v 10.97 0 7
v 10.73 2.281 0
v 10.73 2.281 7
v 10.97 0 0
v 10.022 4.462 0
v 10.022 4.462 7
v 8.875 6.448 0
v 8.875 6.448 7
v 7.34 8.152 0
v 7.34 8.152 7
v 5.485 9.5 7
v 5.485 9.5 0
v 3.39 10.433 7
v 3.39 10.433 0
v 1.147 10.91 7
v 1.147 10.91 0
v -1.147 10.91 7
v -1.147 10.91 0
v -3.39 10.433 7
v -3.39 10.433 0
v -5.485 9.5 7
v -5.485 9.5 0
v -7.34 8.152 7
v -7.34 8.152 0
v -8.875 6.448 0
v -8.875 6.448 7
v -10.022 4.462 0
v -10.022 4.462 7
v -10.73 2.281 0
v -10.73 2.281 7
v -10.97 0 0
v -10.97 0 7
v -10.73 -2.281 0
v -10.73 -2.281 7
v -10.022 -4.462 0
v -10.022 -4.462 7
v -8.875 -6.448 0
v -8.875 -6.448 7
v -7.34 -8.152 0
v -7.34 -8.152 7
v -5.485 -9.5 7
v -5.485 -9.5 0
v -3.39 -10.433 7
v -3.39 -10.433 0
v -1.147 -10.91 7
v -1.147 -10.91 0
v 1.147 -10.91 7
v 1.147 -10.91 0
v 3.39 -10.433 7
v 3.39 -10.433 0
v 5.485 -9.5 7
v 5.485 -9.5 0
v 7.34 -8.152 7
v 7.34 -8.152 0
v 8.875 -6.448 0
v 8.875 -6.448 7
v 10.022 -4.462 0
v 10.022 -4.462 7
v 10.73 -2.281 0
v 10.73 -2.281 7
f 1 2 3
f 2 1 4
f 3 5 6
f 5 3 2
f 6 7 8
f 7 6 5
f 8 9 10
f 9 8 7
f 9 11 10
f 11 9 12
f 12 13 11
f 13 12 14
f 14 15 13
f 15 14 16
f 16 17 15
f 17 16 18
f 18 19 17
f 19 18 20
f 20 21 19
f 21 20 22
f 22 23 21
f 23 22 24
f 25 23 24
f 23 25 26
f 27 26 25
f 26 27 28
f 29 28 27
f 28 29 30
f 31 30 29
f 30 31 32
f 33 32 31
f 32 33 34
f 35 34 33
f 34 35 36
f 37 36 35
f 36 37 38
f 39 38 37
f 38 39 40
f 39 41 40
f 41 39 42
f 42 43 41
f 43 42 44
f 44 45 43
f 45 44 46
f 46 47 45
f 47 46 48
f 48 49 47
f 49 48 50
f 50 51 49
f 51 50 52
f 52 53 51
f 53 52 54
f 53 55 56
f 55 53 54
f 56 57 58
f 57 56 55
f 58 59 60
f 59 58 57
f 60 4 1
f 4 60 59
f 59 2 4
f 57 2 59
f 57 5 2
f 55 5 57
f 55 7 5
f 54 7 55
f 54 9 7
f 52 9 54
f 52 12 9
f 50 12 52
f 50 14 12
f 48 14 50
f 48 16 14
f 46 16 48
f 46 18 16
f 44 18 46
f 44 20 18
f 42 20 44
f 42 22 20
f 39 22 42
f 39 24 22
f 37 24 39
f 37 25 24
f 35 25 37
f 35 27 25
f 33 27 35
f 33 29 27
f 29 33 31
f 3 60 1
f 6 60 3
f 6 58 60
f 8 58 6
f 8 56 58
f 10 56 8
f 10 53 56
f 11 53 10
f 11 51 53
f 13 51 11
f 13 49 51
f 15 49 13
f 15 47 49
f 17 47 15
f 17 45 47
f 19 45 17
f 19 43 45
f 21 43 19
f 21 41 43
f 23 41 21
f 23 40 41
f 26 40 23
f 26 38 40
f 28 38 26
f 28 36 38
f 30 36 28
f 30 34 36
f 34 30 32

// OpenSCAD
bearingdiam = 21.9+.04;
bearingheight = 7;

module bearing( bearingdiam = 21.9+.04, bearingheight = 7);
{
	cylinder(bearingheight, bearingdiam/2, bearingdiam/2, 0);
}
bearing();
